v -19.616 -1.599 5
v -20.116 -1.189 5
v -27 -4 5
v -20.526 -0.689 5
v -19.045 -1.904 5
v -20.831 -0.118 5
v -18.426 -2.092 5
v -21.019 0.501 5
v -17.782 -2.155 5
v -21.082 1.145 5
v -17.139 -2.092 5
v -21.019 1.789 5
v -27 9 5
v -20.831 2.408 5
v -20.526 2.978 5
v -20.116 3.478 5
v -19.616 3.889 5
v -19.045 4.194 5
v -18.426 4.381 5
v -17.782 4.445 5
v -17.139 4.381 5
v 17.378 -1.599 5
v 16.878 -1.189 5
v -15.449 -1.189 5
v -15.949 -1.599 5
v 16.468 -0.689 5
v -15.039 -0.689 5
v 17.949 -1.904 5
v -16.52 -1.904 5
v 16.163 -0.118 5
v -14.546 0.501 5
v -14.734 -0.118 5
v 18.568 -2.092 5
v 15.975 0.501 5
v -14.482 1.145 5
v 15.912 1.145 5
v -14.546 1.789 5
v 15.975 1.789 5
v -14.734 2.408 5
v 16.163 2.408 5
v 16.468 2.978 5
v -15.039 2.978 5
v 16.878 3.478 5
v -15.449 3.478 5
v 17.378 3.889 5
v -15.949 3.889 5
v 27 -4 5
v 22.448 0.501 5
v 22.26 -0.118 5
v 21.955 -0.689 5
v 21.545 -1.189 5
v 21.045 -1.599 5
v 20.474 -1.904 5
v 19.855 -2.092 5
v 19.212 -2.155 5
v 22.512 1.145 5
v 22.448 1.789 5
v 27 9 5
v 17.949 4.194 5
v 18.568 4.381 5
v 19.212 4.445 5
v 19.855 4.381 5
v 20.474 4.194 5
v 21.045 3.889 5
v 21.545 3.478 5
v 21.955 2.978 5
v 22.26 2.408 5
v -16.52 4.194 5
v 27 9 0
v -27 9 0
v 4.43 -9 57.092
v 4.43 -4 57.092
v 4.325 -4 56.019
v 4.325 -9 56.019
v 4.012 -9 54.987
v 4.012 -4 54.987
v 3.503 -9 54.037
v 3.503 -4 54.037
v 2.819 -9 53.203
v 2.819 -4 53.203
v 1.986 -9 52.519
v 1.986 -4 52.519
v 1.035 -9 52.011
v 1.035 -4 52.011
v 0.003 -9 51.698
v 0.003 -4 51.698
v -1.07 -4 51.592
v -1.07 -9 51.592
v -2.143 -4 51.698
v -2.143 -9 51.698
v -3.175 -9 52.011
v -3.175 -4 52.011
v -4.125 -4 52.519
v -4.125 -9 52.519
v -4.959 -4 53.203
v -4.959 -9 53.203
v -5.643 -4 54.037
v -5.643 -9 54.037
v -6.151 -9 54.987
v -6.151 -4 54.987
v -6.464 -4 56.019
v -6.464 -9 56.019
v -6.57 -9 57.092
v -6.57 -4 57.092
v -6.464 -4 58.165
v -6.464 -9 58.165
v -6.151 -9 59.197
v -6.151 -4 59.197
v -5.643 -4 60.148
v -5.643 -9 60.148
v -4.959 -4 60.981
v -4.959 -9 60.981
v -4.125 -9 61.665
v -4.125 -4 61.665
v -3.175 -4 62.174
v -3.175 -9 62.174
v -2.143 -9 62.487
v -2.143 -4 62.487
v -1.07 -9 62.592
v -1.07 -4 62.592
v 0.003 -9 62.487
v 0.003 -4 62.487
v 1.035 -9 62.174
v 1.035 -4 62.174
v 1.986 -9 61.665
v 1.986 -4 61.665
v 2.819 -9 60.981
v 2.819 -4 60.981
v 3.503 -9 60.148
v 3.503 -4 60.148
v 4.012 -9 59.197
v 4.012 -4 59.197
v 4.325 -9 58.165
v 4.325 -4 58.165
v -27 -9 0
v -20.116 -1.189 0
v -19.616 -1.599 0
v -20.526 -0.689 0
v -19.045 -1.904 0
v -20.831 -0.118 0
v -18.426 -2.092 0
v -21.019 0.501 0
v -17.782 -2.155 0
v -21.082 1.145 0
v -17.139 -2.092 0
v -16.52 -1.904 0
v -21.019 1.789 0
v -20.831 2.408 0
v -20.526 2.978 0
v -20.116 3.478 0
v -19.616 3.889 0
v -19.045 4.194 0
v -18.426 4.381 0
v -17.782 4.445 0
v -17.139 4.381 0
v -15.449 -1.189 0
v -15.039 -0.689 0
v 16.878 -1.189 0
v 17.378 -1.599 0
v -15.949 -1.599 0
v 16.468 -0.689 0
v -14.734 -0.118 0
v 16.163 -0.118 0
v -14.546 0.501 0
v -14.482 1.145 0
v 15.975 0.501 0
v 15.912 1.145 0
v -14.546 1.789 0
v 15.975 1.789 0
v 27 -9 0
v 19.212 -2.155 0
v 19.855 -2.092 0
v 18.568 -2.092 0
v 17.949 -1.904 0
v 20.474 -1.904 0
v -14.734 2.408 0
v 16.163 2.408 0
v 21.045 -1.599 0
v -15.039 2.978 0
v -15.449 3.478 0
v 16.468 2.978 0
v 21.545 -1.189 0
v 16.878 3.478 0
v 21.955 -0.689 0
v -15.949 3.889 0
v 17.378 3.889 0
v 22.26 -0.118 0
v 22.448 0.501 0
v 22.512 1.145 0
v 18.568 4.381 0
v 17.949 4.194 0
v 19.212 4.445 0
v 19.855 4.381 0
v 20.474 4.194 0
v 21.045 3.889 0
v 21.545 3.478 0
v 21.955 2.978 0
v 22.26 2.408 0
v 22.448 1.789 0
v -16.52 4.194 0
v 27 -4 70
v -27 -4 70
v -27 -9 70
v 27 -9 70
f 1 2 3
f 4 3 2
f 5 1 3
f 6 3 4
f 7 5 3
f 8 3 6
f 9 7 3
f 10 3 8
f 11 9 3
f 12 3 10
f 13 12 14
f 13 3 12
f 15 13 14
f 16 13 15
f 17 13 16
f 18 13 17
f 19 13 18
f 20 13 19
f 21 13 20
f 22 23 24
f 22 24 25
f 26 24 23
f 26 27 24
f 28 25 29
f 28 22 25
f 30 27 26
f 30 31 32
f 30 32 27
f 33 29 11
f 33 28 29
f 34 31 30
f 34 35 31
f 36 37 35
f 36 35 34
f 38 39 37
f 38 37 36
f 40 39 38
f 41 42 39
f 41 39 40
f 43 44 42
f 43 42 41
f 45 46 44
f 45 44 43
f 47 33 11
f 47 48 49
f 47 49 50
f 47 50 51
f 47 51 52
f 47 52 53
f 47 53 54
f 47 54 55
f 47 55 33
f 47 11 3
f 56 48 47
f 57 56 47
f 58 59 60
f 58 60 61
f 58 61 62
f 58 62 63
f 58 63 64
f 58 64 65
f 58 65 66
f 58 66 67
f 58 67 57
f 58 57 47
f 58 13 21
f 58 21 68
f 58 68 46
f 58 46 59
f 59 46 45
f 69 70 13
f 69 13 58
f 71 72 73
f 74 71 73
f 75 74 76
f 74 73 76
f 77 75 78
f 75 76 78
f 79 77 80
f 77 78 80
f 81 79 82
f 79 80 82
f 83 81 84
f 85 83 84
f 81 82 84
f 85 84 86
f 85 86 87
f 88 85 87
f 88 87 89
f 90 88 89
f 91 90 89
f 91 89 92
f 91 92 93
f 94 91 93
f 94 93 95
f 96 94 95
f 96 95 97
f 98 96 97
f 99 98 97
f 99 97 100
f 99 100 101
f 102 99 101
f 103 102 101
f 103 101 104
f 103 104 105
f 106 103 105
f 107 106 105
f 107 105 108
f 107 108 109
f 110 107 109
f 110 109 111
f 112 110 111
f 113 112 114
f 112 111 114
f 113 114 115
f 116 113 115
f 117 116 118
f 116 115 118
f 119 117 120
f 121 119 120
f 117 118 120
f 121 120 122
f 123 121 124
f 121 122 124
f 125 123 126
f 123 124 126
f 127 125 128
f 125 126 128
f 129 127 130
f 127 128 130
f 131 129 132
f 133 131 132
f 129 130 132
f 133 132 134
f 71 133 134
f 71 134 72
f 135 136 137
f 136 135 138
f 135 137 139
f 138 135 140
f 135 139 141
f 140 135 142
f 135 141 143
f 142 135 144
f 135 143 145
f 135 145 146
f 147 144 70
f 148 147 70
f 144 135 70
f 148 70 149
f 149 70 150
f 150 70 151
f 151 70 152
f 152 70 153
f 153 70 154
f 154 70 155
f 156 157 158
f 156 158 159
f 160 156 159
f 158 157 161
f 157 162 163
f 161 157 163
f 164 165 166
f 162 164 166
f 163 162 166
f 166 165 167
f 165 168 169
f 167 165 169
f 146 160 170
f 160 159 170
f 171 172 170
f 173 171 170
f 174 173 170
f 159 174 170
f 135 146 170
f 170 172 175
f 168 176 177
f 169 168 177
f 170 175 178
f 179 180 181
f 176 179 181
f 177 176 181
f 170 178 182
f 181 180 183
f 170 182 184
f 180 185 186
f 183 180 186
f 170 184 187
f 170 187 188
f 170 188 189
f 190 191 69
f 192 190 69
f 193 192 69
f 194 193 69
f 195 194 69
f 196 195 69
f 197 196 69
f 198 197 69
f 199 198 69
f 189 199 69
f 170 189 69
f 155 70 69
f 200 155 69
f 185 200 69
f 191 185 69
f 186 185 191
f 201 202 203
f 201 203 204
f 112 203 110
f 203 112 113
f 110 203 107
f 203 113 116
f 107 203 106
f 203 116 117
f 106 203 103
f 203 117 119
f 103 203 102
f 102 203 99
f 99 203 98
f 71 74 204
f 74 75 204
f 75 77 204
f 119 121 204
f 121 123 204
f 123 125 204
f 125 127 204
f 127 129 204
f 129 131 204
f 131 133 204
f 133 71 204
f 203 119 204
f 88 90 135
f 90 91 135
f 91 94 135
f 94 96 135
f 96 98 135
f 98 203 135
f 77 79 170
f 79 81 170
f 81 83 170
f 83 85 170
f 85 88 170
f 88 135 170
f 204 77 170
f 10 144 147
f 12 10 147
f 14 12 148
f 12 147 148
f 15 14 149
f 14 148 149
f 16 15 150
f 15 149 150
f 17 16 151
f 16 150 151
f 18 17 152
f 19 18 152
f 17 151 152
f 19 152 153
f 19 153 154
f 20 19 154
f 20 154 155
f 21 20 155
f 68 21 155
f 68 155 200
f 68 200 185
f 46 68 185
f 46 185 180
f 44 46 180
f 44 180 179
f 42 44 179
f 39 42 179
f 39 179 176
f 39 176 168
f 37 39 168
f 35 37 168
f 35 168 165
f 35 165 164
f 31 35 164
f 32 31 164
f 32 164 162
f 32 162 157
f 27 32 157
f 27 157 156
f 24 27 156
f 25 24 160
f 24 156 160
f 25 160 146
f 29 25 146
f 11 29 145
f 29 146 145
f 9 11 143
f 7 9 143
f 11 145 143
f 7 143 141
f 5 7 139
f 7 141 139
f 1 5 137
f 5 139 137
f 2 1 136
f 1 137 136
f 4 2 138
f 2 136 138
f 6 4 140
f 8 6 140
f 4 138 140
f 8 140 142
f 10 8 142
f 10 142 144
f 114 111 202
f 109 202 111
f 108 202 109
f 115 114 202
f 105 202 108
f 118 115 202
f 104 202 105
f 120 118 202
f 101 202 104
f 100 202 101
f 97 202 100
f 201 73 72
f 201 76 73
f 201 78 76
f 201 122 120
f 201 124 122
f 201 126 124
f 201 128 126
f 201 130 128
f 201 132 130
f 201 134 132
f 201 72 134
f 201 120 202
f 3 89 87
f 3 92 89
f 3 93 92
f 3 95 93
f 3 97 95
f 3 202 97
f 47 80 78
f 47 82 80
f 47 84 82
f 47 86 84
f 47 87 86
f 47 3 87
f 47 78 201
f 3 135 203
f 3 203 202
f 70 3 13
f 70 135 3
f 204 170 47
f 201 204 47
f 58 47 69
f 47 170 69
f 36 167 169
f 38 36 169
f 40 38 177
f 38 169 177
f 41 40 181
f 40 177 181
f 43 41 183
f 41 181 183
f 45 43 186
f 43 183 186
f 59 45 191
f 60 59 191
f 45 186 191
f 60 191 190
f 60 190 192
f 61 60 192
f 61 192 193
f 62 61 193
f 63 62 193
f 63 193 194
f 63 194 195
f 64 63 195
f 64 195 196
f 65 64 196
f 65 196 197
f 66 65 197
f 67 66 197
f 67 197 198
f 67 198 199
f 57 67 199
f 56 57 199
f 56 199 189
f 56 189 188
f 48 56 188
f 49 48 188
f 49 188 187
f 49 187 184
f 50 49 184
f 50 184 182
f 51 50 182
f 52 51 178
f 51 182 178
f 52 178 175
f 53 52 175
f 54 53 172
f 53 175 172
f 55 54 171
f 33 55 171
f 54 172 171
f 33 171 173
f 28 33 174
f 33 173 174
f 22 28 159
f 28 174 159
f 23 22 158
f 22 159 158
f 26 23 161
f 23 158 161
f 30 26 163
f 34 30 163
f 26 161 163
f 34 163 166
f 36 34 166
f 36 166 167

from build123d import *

# Parameters (mm, degrees)
ESQUISSE1_W             = 54
ESQUISSE1_H             = 18
BOSS_EXTRU_1_DEPTH      = 70
ESQUISSE2_W             = 89.885876072
ESQUISSE2_H             = 74.564815434
ENL_V_MAT_EXTRU_1_DEPTH = 13
M6_CLEARANCE_HOLE1_D    = 6.6
M10_CLEARANCE_HOLE1_D   = 11


with BuildPart() as part:
    # Esquisse1 → Boss.-Extru.1 (new body)
    with BuildSketch(Plane.XY):
        Rectangle(ESQUISSE1_W, ESQUISSE1_H)
    extrude(amount=BOSS_EXTRU_1_DEPTH)

    # Esquisse2 → Enlèv. mat.-Extru.1 (cut)
    with BuildSketch(Plane(origin=(0, 9, 0), x_dir=(1, 0, 0), z_dir=(0, 1, 0))):
        with Locations((-2.437014962, -42.282407717)):
            Rectangle(ESQUISSE2_W, ESQUISSE2_H)
    extrude(amount=-ENL_V_MAT_EXTRU_1_DEPTH, mode=Mode.SUBTRACT)

    # M6 Clearance Hole1 (through all)
    with Locations(Plane.XY.offset(5)):
        with Locations((19.211630693, 1.144746785), (-17.782403657, 1.144746785)):
            Hole(M6_CLEARANCE_HOLE1_D / 2)

    # M10 Clearance Hole1 (through all)
    with Locations(Plane(origin=(0, -9, 0), x_dir=(-1, 0, 0), z_dir=(0, -1, 0))):
        with Locations((1.06980506, -57.092210499)):
            Hole(M10_CLEARANCE_HOLE1_D / 2)


solid = part.part
